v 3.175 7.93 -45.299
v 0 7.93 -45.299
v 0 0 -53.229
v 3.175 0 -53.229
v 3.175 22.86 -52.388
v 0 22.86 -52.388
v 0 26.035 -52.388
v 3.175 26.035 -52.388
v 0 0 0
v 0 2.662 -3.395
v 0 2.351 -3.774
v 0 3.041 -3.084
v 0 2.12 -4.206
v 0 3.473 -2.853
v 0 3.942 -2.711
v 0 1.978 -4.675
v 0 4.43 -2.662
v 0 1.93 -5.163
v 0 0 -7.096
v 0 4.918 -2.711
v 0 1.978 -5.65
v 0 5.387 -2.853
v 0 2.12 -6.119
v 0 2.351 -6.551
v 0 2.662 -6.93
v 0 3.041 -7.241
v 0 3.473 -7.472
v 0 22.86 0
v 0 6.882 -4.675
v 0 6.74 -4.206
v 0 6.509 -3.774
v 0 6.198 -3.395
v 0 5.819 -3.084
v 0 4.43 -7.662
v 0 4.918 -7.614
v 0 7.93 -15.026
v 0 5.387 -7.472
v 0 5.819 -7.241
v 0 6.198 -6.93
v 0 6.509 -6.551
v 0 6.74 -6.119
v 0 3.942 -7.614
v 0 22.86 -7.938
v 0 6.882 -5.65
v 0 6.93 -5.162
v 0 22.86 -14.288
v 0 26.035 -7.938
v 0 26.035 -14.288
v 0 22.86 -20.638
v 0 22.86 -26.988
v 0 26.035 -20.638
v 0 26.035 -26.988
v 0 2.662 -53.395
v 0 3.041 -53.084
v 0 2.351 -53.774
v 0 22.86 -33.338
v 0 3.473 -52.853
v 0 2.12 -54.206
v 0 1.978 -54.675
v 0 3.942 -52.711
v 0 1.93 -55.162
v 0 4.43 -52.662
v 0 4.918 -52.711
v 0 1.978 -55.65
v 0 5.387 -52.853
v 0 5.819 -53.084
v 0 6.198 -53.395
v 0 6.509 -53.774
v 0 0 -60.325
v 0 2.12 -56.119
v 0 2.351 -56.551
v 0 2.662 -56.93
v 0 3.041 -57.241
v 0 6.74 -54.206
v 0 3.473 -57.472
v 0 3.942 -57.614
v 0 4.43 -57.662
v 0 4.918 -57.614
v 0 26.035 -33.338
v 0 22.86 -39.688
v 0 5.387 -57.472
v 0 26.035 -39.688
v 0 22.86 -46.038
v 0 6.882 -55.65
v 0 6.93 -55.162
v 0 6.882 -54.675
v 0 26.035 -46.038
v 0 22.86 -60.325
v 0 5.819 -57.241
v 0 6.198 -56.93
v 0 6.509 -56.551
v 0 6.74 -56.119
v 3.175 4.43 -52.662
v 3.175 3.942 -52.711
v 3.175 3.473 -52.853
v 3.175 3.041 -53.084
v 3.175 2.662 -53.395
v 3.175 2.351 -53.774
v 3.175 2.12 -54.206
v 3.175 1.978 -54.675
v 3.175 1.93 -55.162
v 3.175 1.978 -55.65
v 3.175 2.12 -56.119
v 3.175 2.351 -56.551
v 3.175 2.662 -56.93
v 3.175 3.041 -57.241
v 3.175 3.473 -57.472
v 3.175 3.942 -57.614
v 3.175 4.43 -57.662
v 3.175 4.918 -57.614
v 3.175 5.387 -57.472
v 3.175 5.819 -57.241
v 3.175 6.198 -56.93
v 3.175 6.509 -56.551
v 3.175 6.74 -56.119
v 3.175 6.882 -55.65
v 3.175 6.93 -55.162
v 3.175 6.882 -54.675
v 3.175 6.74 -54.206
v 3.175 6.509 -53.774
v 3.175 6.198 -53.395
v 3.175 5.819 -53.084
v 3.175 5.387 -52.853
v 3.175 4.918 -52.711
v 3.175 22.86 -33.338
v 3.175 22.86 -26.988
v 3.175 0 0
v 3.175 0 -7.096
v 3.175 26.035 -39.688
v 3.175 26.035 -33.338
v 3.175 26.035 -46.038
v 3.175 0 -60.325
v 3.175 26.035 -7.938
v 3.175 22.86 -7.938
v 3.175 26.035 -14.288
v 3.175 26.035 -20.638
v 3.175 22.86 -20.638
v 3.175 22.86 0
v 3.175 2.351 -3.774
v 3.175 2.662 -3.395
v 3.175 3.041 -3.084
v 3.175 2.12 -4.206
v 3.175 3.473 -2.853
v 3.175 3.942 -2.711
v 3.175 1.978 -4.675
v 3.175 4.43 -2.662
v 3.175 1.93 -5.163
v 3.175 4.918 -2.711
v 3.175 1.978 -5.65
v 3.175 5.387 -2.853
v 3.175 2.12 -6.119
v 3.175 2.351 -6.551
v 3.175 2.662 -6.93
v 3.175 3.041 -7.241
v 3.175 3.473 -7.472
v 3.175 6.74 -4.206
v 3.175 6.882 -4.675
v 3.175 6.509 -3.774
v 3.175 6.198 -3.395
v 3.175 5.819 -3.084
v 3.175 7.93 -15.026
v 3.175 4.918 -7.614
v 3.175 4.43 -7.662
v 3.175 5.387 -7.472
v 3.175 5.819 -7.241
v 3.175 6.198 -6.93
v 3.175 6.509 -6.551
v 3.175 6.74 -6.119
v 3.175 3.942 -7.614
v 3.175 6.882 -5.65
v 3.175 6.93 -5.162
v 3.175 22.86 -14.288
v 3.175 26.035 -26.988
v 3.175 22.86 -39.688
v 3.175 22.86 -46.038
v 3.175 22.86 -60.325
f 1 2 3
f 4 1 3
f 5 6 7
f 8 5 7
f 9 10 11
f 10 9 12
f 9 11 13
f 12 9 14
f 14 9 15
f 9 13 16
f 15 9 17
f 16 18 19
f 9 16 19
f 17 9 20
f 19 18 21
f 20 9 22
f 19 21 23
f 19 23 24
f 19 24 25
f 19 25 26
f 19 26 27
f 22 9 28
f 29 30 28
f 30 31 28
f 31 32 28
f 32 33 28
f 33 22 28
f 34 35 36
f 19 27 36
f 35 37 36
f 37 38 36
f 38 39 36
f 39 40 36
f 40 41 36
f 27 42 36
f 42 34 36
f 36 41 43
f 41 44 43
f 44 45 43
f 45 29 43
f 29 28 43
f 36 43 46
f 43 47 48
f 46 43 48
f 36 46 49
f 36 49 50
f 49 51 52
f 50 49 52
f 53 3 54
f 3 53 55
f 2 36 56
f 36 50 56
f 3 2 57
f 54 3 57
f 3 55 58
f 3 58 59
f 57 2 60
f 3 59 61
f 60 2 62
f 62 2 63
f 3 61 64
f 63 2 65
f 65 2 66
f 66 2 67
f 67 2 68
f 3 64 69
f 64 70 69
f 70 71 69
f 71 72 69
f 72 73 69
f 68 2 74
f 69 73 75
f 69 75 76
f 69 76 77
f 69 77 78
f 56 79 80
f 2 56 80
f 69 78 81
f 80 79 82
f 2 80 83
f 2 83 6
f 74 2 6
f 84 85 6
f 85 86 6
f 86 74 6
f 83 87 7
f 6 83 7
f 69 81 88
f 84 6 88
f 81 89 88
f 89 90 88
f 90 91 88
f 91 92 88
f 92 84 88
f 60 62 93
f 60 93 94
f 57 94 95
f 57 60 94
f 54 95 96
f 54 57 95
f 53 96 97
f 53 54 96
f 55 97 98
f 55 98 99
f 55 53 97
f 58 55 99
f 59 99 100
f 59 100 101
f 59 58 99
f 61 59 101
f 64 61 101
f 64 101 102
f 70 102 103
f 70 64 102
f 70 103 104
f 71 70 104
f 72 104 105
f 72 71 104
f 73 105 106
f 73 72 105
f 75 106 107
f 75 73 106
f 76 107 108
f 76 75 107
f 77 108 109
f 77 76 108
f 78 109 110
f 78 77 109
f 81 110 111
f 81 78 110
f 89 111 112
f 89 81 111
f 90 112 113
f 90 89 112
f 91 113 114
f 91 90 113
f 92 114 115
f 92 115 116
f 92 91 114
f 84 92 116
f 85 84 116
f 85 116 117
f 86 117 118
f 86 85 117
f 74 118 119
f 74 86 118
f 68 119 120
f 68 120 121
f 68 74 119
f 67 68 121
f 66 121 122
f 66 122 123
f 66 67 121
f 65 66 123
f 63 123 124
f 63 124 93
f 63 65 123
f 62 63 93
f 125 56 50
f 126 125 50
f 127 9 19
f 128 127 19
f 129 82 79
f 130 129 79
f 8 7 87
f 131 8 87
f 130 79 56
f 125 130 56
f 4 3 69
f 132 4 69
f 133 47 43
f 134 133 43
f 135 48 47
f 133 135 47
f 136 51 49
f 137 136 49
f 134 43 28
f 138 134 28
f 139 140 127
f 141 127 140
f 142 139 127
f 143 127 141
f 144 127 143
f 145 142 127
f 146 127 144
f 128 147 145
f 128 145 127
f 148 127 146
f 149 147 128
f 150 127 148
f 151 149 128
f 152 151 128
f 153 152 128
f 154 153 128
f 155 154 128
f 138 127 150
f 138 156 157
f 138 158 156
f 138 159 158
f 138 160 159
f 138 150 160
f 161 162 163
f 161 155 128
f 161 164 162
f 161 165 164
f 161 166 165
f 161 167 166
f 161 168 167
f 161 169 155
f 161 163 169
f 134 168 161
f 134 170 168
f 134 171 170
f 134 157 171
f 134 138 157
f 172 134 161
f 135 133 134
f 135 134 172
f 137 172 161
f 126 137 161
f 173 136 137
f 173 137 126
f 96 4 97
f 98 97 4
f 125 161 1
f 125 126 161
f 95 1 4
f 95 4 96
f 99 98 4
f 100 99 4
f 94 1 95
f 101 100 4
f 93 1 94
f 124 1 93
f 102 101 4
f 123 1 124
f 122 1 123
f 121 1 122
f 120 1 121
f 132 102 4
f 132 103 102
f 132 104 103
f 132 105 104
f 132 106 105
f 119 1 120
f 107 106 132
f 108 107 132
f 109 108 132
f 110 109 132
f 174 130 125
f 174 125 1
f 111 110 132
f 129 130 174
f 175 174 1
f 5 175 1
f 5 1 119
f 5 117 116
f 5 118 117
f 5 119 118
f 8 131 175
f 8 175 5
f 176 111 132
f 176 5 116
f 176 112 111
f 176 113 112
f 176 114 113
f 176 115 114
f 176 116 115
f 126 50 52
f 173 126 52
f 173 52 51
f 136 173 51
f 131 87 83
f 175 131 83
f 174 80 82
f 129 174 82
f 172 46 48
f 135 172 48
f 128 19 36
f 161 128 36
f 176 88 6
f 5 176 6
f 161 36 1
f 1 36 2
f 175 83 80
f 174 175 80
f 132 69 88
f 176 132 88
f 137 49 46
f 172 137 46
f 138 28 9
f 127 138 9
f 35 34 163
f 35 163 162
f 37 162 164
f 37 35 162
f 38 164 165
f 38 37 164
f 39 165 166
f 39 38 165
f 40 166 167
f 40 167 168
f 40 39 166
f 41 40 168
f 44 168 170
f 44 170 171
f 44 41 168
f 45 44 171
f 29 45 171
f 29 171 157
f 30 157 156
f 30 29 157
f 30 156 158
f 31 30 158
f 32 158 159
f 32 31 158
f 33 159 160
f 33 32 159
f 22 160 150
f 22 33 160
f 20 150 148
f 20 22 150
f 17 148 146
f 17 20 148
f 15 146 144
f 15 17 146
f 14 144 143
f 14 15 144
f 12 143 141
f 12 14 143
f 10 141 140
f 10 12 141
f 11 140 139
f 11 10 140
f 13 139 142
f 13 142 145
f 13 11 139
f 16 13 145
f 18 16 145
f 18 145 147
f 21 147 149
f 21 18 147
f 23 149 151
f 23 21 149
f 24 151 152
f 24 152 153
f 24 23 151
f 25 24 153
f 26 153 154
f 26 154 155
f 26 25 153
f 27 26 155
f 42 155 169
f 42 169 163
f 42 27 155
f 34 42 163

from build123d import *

# Parameters (mm, degrees)
SKETCH1_R           = 2.5
BOSS_EXTRUDE1_DEPTH = 3.175


with BuildPart() as part:
    # Sketch1 → Boss-Extrude1 (new body)
    with BuildSketch(Plane(origin=(0, 0, 0), x_dir=(0, 0, -1), z_dir=(1, 0, 0))):
        Polygon((0, 0), (7.096461031, 0), (15.026461031, 7.93), (45.298538969, 7.93), (53.228538969, 0), (60.325, 0), (60.325, 22.86), (52.3875, 22.86), (52.3875, 26.035), (46.0375, 26.035), (46.0375, 22.86), (39.6875, 22.86), (39.6875, 26.035), (33.3375, 26.035), (33.3375, 22.86), (26.9875, 22.86), (26.9875, 26.035), (20.6375, 26.035), (20.6375, 22.86), (14.2875, 22.86), (14.2875, 26.035), (7.9375, 26.035), (7.9375, 22.86), (0, 22.86), align=None)
        with Locations((5.1625, 4.43)):
            Circle(SKETCH1_R, mode=Mode.SUBTRACT)
        with Locations(Location((55.1625, 4.43, 0), (0, 0, 180))):
            Circle(SKETCH1_R, mode=Mode.SUBTRACT)
    extrude(amount=BOSS_EXTRUDE1_DEPTH)


solid = part.part
